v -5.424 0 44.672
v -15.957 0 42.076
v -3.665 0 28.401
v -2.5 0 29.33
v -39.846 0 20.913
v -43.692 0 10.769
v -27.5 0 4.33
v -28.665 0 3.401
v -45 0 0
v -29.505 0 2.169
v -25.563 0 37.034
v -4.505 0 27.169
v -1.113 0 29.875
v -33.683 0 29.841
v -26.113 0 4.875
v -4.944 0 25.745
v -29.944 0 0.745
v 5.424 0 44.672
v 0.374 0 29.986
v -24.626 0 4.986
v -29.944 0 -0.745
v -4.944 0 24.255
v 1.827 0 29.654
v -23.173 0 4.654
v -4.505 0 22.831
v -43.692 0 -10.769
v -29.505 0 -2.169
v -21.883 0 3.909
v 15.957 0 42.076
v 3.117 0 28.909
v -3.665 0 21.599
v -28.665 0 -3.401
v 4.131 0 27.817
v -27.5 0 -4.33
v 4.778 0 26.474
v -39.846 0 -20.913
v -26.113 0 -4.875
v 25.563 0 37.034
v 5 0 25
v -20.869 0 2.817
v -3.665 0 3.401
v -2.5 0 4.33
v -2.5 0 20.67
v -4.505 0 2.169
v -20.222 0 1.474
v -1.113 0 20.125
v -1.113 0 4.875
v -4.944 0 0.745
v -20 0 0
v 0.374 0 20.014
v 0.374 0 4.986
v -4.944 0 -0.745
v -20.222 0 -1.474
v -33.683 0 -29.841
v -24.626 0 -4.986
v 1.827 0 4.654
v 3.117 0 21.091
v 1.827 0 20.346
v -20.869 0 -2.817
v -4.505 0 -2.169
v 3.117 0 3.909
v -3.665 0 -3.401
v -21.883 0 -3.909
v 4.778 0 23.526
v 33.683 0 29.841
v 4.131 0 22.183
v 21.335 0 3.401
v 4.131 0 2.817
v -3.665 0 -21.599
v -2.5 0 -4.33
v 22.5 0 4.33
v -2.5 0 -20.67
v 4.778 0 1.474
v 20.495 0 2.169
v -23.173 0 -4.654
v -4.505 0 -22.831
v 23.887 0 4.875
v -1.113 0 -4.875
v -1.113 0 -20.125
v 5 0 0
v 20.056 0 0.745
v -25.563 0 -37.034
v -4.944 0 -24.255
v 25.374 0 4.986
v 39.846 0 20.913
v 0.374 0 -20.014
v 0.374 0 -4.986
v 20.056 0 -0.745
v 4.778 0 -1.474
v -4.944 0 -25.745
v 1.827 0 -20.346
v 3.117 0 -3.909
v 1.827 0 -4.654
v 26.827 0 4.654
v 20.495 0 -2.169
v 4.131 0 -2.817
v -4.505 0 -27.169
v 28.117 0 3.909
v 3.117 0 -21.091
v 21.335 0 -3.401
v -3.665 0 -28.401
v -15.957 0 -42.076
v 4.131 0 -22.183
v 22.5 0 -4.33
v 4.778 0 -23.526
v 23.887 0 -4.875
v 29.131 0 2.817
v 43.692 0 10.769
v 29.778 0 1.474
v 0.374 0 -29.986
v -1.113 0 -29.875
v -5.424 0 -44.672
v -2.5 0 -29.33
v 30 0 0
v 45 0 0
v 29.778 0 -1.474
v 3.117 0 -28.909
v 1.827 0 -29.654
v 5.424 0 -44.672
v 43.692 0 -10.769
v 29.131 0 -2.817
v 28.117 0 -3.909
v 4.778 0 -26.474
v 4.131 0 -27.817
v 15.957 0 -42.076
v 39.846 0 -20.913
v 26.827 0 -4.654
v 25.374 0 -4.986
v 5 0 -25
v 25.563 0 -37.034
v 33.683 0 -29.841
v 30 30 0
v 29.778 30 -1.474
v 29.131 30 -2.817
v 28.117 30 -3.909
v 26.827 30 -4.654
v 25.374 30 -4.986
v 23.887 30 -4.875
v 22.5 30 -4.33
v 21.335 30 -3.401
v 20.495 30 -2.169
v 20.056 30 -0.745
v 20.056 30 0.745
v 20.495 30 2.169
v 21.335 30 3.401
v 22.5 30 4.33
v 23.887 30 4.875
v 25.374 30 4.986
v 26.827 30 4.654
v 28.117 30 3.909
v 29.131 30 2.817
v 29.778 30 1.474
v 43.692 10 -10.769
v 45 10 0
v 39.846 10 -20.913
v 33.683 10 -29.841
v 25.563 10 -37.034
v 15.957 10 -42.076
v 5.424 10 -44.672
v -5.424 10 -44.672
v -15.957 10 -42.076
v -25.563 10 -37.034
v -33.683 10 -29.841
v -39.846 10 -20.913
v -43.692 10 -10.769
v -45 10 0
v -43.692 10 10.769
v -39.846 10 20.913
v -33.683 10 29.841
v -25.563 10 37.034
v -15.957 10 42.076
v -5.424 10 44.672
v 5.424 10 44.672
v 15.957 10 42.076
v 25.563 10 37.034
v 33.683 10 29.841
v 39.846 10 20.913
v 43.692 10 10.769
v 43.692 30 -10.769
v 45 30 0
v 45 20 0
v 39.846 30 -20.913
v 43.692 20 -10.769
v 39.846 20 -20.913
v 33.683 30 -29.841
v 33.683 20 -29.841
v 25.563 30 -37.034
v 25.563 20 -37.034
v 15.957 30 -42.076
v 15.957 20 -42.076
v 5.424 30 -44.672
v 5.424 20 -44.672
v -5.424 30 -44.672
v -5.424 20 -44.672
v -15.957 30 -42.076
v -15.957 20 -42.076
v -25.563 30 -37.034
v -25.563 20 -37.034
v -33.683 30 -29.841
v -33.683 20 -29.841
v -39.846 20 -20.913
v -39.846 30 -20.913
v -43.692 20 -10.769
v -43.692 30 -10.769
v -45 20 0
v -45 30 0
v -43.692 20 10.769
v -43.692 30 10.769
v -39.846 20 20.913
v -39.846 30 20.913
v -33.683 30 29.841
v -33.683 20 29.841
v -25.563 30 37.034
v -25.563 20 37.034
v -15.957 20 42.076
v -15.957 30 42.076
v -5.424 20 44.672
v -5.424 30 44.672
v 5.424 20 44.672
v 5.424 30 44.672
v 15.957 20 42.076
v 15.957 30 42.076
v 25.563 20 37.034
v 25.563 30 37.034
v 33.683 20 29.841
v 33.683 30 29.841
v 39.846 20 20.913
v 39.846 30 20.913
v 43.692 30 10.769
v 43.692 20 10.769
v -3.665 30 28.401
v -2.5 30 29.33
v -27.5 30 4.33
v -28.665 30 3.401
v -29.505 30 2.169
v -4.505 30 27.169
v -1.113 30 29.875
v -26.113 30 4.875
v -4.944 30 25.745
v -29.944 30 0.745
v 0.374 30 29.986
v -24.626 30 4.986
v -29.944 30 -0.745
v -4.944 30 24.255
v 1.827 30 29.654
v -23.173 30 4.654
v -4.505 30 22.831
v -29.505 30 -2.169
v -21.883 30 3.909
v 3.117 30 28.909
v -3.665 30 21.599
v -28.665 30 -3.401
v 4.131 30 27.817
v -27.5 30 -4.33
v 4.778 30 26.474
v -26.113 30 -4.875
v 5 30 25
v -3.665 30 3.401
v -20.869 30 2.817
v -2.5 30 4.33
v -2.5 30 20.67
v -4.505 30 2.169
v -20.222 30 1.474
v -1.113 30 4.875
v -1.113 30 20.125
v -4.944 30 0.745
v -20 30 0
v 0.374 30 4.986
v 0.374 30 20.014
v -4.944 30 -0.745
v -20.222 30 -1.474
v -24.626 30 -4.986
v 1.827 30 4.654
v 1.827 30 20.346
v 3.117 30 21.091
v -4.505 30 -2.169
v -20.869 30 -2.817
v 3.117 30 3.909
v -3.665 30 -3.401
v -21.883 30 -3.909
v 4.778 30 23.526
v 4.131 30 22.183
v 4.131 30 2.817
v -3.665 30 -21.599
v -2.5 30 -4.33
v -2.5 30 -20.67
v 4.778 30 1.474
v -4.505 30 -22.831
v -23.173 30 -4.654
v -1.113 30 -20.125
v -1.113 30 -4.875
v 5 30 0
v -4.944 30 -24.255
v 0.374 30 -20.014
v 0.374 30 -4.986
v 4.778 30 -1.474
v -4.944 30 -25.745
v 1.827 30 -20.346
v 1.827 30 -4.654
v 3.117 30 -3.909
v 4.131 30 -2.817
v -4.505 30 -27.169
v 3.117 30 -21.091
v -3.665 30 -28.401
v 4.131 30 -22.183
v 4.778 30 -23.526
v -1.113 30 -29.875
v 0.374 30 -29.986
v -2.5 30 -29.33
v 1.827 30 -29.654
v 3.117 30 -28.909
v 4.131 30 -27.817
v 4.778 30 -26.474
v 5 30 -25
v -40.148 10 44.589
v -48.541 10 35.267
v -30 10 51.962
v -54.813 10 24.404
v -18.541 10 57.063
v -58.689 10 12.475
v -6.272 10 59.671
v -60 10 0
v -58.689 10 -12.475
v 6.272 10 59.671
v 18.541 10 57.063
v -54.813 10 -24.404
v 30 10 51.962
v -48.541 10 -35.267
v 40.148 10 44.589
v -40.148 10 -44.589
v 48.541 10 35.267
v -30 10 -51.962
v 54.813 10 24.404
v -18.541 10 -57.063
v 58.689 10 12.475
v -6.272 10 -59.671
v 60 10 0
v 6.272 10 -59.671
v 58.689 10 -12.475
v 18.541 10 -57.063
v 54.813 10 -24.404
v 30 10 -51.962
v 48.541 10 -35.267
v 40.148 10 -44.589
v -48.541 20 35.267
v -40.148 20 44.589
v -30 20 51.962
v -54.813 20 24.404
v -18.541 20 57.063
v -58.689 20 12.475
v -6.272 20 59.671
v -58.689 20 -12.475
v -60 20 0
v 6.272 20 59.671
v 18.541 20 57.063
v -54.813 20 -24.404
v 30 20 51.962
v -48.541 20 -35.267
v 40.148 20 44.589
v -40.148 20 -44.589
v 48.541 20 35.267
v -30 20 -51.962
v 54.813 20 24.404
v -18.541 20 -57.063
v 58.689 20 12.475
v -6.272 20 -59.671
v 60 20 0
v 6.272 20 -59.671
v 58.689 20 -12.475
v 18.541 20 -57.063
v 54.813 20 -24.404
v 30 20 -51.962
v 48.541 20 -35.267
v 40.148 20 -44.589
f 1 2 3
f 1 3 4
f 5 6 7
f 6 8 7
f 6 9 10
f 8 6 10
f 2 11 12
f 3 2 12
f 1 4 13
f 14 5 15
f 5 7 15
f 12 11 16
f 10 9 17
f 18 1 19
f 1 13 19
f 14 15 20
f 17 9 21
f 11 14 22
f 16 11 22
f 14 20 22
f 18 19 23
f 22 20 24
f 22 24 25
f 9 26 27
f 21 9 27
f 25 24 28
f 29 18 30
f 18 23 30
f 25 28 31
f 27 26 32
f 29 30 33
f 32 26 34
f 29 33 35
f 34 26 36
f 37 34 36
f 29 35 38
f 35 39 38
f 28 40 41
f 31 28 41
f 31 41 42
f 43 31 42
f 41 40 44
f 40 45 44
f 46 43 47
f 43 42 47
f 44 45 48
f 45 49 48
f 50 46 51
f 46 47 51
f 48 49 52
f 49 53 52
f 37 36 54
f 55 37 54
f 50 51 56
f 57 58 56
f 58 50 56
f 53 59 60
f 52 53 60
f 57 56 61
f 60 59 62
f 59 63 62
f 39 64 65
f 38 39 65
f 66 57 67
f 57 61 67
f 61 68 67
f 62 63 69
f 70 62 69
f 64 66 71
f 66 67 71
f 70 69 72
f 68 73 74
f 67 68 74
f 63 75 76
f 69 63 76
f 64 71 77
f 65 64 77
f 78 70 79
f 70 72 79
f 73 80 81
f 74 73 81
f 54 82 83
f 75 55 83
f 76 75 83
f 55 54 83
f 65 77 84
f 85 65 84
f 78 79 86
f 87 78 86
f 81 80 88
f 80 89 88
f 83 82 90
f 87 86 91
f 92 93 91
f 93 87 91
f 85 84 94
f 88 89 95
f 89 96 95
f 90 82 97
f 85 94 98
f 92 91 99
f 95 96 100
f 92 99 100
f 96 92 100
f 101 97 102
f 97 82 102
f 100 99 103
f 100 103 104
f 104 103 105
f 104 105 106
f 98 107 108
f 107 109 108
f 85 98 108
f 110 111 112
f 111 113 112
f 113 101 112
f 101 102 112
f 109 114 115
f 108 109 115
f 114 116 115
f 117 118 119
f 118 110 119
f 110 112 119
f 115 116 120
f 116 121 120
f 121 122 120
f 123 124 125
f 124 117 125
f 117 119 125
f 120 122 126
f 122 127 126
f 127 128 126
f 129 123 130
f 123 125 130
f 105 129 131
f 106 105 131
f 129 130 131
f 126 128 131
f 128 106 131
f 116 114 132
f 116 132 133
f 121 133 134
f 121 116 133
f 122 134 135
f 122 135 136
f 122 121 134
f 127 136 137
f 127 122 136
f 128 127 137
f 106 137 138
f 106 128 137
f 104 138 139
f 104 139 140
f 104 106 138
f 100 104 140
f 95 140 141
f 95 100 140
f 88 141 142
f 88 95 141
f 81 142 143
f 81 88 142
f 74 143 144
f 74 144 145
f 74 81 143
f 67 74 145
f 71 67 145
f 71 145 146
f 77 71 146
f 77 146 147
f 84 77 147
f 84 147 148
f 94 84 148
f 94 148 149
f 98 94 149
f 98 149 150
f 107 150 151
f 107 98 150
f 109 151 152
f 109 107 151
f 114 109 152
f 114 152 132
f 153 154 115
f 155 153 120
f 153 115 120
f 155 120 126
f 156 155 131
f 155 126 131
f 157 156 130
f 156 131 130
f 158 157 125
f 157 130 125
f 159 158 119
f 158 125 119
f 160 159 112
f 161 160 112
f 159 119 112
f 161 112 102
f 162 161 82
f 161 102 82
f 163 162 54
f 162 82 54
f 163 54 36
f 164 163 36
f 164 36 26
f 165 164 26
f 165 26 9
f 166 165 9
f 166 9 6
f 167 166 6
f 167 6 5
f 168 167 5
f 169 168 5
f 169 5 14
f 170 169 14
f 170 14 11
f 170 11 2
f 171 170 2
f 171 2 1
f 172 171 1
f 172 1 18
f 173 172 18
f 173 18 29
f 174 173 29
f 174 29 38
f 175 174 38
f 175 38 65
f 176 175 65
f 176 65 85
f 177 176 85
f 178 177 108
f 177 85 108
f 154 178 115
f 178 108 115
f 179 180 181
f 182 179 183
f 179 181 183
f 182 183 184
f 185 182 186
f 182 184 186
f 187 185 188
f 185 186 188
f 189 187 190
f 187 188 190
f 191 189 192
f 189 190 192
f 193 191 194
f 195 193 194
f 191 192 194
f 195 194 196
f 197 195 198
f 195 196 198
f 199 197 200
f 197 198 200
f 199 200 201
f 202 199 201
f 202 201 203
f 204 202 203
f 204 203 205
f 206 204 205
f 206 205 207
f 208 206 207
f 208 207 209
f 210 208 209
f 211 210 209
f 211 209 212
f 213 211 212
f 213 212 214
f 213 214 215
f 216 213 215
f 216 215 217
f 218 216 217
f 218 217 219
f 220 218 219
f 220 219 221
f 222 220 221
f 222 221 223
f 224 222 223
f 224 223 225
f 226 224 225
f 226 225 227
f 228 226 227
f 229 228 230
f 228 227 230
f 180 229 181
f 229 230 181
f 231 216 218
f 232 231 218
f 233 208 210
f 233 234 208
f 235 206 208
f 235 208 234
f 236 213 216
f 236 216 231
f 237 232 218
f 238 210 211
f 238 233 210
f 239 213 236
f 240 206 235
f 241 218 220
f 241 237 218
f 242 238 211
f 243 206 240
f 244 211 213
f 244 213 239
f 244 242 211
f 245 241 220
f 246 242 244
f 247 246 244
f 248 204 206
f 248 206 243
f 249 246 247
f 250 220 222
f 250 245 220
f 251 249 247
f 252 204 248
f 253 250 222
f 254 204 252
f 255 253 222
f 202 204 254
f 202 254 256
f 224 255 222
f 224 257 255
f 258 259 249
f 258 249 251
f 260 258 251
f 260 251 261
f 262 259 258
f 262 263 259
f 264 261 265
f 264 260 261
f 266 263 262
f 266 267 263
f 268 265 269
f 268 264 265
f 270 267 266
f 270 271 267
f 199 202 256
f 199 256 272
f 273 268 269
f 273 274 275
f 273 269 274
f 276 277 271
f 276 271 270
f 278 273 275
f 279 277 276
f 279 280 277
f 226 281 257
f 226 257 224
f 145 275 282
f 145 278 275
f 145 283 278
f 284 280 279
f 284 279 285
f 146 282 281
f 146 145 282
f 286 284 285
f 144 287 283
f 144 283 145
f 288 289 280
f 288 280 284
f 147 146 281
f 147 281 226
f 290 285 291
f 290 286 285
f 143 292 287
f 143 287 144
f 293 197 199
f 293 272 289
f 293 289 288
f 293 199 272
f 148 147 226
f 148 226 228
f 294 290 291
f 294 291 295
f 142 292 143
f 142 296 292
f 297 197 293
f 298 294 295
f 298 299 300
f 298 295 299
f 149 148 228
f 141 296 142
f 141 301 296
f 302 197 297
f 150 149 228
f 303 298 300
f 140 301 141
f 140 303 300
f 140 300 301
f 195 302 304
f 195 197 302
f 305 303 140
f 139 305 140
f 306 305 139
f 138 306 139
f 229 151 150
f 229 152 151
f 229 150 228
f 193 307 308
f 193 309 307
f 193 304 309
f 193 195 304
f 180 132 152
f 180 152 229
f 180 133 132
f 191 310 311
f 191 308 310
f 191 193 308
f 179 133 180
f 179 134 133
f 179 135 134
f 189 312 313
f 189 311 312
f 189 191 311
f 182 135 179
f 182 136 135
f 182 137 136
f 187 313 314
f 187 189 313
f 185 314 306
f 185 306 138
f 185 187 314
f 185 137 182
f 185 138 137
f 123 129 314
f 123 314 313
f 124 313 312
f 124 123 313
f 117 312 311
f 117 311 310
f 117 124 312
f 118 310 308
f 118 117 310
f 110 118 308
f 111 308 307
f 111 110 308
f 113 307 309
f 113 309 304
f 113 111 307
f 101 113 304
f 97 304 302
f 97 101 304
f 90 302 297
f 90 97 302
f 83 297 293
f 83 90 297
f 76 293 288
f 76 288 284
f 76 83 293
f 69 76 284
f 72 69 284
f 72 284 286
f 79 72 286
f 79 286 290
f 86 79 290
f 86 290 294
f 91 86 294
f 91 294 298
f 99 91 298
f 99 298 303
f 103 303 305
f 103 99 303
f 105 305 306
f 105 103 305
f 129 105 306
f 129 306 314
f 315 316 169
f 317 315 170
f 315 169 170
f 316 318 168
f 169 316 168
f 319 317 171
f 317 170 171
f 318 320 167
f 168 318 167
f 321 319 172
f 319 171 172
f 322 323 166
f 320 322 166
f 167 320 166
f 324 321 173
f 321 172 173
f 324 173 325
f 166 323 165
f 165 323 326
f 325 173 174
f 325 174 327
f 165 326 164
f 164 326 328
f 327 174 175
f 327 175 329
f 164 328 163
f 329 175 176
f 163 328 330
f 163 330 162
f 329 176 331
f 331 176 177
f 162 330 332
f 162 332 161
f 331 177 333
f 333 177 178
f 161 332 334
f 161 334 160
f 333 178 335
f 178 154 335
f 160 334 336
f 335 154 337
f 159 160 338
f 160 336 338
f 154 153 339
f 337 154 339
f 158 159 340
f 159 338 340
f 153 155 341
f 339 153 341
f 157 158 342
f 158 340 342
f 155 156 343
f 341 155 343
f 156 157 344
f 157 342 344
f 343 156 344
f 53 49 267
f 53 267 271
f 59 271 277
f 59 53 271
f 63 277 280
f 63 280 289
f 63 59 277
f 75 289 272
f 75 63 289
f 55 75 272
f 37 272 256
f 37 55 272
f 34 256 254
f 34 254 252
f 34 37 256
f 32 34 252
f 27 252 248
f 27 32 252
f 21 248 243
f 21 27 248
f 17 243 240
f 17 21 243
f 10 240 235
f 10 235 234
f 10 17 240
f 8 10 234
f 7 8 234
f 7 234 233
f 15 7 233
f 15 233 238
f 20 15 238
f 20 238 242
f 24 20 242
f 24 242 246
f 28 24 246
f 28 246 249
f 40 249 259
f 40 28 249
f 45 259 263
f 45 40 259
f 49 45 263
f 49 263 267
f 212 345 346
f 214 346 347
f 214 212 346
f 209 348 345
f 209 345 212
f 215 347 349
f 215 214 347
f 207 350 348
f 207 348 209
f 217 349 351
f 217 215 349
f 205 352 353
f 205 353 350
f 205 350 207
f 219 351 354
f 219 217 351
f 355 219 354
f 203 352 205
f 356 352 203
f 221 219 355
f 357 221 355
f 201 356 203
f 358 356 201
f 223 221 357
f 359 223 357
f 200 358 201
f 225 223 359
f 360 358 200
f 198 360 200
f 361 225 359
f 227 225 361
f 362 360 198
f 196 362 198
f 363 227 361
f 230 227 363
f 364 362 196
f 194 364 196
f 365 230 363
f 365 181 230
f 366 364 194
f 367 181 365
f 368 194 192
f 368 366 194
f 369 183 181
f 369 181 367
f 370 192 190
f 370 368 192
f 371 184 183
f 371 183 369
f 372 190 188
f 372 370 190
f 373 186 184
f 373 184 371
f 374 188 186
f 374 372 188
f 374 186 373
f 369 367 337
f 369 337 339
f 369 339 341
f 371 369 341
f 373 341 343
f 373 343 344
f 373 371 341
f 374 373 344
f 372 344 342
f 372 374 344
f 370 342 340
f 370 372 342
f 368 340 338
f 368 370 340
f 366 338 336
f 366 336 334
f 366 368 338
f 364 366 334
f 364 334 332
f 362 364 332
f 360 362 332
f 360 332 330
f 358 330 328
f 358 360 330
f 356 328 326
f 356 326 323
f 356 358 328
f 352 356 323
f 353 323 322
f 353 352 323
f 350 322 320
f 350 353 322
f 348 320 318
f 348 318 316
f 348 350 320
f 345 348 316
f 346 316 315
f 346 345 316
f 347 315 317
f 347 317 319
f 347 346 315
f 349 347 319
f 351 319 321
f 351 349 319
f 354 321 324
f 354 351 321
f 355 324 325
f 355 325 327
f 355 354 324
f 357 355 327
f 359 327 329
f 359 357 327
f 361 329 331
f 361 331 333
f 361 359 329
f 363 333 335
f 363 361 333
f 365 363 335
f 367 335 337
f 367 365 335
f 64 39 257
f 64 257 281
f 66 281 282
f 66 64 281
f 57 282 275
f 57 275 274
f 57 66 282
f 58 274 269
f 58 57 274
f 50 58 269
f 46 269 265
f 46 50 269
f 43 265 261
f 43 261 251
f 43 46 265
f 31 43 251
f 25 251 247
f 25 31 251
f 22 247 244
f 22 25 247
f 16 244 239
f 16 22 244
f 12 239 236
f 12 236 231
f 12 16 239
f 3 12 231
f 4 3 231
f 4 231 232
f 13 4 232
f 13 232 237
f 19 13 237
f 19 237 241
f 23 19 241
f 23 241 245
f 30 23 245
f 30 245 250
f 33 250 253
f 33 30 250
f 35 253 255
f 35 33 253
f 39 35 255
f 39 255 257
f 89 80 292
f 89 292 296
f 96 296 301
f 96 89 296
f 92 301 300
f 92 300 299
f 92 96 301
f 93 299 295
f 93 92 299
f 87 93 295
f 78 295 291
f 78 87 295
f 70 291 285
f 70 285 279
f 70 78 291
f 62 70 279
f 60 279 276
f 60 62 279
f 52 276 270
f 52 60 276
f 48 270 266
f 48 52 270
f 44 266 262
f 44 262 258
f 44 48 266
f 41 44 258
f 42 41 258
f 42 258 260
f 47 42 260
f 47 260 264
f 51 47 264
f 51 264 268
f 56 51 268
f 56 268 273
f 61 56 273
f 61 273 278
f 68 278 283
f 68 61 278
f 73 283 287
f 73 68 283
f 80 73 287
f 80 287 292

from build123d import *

# Parameters (mm, degrees)
CROQUIS1_R              = 45
CROQUIS1_R_2            = 5
SALIENTE_EXTRUIR1_DEPTH = 30
SALIENTE_EXTRUIR2_START = -10
CROQUIS2_R              = 60
CROQUIS2_R_2            = 45
SALIENTE_EXTRUIR2_DEPTH = 10


with BuildPart() as part:
    # Croquis1 → Saliente-Extruir1 (new body)
    with BuildSketch(Plane(origin=(0, 0, 0), x_dir=(1, 0, 0), z_dir=(0, 1, 0))):
        Circle(CROQUIS1_R)
        Circle(CROQUIS1_R_2, mode=Mode.SUBTRACT)
        with Locations((0, 25)):
            Circle(CROQUIS1_R_2, mode=Mode.SUBTRACT)
        with Locations((25, 0)):
            Circle(CROQUIS1_R_2, mode=Mode.SUBTRACT)
        with Locations((0, -25)):
            Circle(CROQUIS1_R_2, mode=Mode.SUBTRACT)
        with Locations((-25, 0)):
            Circle(CROQUIS1_R_2, mode=Mode.SUBTRACT)
    extrude(amount=SALIENTE_EXTRUIR1_DEPTH)

    # Croquis2 → Saliente-Extruir2 (add)
    with BuildSketch(Plane(origin=(0, 30, 0), x_dir=(1, 0, 0), z_dir=(0, 1, 0)).offset(SALIENTE_EXTRUIR2_START)):
        Circle(CROQUIS2_R)
        Circle(CROQUIS2_R_2, mode=Mode.SUBTRACT)
    extrude(amount=-SALIENTE_EXTRUIR2_DEPTH)


solid = part.part
